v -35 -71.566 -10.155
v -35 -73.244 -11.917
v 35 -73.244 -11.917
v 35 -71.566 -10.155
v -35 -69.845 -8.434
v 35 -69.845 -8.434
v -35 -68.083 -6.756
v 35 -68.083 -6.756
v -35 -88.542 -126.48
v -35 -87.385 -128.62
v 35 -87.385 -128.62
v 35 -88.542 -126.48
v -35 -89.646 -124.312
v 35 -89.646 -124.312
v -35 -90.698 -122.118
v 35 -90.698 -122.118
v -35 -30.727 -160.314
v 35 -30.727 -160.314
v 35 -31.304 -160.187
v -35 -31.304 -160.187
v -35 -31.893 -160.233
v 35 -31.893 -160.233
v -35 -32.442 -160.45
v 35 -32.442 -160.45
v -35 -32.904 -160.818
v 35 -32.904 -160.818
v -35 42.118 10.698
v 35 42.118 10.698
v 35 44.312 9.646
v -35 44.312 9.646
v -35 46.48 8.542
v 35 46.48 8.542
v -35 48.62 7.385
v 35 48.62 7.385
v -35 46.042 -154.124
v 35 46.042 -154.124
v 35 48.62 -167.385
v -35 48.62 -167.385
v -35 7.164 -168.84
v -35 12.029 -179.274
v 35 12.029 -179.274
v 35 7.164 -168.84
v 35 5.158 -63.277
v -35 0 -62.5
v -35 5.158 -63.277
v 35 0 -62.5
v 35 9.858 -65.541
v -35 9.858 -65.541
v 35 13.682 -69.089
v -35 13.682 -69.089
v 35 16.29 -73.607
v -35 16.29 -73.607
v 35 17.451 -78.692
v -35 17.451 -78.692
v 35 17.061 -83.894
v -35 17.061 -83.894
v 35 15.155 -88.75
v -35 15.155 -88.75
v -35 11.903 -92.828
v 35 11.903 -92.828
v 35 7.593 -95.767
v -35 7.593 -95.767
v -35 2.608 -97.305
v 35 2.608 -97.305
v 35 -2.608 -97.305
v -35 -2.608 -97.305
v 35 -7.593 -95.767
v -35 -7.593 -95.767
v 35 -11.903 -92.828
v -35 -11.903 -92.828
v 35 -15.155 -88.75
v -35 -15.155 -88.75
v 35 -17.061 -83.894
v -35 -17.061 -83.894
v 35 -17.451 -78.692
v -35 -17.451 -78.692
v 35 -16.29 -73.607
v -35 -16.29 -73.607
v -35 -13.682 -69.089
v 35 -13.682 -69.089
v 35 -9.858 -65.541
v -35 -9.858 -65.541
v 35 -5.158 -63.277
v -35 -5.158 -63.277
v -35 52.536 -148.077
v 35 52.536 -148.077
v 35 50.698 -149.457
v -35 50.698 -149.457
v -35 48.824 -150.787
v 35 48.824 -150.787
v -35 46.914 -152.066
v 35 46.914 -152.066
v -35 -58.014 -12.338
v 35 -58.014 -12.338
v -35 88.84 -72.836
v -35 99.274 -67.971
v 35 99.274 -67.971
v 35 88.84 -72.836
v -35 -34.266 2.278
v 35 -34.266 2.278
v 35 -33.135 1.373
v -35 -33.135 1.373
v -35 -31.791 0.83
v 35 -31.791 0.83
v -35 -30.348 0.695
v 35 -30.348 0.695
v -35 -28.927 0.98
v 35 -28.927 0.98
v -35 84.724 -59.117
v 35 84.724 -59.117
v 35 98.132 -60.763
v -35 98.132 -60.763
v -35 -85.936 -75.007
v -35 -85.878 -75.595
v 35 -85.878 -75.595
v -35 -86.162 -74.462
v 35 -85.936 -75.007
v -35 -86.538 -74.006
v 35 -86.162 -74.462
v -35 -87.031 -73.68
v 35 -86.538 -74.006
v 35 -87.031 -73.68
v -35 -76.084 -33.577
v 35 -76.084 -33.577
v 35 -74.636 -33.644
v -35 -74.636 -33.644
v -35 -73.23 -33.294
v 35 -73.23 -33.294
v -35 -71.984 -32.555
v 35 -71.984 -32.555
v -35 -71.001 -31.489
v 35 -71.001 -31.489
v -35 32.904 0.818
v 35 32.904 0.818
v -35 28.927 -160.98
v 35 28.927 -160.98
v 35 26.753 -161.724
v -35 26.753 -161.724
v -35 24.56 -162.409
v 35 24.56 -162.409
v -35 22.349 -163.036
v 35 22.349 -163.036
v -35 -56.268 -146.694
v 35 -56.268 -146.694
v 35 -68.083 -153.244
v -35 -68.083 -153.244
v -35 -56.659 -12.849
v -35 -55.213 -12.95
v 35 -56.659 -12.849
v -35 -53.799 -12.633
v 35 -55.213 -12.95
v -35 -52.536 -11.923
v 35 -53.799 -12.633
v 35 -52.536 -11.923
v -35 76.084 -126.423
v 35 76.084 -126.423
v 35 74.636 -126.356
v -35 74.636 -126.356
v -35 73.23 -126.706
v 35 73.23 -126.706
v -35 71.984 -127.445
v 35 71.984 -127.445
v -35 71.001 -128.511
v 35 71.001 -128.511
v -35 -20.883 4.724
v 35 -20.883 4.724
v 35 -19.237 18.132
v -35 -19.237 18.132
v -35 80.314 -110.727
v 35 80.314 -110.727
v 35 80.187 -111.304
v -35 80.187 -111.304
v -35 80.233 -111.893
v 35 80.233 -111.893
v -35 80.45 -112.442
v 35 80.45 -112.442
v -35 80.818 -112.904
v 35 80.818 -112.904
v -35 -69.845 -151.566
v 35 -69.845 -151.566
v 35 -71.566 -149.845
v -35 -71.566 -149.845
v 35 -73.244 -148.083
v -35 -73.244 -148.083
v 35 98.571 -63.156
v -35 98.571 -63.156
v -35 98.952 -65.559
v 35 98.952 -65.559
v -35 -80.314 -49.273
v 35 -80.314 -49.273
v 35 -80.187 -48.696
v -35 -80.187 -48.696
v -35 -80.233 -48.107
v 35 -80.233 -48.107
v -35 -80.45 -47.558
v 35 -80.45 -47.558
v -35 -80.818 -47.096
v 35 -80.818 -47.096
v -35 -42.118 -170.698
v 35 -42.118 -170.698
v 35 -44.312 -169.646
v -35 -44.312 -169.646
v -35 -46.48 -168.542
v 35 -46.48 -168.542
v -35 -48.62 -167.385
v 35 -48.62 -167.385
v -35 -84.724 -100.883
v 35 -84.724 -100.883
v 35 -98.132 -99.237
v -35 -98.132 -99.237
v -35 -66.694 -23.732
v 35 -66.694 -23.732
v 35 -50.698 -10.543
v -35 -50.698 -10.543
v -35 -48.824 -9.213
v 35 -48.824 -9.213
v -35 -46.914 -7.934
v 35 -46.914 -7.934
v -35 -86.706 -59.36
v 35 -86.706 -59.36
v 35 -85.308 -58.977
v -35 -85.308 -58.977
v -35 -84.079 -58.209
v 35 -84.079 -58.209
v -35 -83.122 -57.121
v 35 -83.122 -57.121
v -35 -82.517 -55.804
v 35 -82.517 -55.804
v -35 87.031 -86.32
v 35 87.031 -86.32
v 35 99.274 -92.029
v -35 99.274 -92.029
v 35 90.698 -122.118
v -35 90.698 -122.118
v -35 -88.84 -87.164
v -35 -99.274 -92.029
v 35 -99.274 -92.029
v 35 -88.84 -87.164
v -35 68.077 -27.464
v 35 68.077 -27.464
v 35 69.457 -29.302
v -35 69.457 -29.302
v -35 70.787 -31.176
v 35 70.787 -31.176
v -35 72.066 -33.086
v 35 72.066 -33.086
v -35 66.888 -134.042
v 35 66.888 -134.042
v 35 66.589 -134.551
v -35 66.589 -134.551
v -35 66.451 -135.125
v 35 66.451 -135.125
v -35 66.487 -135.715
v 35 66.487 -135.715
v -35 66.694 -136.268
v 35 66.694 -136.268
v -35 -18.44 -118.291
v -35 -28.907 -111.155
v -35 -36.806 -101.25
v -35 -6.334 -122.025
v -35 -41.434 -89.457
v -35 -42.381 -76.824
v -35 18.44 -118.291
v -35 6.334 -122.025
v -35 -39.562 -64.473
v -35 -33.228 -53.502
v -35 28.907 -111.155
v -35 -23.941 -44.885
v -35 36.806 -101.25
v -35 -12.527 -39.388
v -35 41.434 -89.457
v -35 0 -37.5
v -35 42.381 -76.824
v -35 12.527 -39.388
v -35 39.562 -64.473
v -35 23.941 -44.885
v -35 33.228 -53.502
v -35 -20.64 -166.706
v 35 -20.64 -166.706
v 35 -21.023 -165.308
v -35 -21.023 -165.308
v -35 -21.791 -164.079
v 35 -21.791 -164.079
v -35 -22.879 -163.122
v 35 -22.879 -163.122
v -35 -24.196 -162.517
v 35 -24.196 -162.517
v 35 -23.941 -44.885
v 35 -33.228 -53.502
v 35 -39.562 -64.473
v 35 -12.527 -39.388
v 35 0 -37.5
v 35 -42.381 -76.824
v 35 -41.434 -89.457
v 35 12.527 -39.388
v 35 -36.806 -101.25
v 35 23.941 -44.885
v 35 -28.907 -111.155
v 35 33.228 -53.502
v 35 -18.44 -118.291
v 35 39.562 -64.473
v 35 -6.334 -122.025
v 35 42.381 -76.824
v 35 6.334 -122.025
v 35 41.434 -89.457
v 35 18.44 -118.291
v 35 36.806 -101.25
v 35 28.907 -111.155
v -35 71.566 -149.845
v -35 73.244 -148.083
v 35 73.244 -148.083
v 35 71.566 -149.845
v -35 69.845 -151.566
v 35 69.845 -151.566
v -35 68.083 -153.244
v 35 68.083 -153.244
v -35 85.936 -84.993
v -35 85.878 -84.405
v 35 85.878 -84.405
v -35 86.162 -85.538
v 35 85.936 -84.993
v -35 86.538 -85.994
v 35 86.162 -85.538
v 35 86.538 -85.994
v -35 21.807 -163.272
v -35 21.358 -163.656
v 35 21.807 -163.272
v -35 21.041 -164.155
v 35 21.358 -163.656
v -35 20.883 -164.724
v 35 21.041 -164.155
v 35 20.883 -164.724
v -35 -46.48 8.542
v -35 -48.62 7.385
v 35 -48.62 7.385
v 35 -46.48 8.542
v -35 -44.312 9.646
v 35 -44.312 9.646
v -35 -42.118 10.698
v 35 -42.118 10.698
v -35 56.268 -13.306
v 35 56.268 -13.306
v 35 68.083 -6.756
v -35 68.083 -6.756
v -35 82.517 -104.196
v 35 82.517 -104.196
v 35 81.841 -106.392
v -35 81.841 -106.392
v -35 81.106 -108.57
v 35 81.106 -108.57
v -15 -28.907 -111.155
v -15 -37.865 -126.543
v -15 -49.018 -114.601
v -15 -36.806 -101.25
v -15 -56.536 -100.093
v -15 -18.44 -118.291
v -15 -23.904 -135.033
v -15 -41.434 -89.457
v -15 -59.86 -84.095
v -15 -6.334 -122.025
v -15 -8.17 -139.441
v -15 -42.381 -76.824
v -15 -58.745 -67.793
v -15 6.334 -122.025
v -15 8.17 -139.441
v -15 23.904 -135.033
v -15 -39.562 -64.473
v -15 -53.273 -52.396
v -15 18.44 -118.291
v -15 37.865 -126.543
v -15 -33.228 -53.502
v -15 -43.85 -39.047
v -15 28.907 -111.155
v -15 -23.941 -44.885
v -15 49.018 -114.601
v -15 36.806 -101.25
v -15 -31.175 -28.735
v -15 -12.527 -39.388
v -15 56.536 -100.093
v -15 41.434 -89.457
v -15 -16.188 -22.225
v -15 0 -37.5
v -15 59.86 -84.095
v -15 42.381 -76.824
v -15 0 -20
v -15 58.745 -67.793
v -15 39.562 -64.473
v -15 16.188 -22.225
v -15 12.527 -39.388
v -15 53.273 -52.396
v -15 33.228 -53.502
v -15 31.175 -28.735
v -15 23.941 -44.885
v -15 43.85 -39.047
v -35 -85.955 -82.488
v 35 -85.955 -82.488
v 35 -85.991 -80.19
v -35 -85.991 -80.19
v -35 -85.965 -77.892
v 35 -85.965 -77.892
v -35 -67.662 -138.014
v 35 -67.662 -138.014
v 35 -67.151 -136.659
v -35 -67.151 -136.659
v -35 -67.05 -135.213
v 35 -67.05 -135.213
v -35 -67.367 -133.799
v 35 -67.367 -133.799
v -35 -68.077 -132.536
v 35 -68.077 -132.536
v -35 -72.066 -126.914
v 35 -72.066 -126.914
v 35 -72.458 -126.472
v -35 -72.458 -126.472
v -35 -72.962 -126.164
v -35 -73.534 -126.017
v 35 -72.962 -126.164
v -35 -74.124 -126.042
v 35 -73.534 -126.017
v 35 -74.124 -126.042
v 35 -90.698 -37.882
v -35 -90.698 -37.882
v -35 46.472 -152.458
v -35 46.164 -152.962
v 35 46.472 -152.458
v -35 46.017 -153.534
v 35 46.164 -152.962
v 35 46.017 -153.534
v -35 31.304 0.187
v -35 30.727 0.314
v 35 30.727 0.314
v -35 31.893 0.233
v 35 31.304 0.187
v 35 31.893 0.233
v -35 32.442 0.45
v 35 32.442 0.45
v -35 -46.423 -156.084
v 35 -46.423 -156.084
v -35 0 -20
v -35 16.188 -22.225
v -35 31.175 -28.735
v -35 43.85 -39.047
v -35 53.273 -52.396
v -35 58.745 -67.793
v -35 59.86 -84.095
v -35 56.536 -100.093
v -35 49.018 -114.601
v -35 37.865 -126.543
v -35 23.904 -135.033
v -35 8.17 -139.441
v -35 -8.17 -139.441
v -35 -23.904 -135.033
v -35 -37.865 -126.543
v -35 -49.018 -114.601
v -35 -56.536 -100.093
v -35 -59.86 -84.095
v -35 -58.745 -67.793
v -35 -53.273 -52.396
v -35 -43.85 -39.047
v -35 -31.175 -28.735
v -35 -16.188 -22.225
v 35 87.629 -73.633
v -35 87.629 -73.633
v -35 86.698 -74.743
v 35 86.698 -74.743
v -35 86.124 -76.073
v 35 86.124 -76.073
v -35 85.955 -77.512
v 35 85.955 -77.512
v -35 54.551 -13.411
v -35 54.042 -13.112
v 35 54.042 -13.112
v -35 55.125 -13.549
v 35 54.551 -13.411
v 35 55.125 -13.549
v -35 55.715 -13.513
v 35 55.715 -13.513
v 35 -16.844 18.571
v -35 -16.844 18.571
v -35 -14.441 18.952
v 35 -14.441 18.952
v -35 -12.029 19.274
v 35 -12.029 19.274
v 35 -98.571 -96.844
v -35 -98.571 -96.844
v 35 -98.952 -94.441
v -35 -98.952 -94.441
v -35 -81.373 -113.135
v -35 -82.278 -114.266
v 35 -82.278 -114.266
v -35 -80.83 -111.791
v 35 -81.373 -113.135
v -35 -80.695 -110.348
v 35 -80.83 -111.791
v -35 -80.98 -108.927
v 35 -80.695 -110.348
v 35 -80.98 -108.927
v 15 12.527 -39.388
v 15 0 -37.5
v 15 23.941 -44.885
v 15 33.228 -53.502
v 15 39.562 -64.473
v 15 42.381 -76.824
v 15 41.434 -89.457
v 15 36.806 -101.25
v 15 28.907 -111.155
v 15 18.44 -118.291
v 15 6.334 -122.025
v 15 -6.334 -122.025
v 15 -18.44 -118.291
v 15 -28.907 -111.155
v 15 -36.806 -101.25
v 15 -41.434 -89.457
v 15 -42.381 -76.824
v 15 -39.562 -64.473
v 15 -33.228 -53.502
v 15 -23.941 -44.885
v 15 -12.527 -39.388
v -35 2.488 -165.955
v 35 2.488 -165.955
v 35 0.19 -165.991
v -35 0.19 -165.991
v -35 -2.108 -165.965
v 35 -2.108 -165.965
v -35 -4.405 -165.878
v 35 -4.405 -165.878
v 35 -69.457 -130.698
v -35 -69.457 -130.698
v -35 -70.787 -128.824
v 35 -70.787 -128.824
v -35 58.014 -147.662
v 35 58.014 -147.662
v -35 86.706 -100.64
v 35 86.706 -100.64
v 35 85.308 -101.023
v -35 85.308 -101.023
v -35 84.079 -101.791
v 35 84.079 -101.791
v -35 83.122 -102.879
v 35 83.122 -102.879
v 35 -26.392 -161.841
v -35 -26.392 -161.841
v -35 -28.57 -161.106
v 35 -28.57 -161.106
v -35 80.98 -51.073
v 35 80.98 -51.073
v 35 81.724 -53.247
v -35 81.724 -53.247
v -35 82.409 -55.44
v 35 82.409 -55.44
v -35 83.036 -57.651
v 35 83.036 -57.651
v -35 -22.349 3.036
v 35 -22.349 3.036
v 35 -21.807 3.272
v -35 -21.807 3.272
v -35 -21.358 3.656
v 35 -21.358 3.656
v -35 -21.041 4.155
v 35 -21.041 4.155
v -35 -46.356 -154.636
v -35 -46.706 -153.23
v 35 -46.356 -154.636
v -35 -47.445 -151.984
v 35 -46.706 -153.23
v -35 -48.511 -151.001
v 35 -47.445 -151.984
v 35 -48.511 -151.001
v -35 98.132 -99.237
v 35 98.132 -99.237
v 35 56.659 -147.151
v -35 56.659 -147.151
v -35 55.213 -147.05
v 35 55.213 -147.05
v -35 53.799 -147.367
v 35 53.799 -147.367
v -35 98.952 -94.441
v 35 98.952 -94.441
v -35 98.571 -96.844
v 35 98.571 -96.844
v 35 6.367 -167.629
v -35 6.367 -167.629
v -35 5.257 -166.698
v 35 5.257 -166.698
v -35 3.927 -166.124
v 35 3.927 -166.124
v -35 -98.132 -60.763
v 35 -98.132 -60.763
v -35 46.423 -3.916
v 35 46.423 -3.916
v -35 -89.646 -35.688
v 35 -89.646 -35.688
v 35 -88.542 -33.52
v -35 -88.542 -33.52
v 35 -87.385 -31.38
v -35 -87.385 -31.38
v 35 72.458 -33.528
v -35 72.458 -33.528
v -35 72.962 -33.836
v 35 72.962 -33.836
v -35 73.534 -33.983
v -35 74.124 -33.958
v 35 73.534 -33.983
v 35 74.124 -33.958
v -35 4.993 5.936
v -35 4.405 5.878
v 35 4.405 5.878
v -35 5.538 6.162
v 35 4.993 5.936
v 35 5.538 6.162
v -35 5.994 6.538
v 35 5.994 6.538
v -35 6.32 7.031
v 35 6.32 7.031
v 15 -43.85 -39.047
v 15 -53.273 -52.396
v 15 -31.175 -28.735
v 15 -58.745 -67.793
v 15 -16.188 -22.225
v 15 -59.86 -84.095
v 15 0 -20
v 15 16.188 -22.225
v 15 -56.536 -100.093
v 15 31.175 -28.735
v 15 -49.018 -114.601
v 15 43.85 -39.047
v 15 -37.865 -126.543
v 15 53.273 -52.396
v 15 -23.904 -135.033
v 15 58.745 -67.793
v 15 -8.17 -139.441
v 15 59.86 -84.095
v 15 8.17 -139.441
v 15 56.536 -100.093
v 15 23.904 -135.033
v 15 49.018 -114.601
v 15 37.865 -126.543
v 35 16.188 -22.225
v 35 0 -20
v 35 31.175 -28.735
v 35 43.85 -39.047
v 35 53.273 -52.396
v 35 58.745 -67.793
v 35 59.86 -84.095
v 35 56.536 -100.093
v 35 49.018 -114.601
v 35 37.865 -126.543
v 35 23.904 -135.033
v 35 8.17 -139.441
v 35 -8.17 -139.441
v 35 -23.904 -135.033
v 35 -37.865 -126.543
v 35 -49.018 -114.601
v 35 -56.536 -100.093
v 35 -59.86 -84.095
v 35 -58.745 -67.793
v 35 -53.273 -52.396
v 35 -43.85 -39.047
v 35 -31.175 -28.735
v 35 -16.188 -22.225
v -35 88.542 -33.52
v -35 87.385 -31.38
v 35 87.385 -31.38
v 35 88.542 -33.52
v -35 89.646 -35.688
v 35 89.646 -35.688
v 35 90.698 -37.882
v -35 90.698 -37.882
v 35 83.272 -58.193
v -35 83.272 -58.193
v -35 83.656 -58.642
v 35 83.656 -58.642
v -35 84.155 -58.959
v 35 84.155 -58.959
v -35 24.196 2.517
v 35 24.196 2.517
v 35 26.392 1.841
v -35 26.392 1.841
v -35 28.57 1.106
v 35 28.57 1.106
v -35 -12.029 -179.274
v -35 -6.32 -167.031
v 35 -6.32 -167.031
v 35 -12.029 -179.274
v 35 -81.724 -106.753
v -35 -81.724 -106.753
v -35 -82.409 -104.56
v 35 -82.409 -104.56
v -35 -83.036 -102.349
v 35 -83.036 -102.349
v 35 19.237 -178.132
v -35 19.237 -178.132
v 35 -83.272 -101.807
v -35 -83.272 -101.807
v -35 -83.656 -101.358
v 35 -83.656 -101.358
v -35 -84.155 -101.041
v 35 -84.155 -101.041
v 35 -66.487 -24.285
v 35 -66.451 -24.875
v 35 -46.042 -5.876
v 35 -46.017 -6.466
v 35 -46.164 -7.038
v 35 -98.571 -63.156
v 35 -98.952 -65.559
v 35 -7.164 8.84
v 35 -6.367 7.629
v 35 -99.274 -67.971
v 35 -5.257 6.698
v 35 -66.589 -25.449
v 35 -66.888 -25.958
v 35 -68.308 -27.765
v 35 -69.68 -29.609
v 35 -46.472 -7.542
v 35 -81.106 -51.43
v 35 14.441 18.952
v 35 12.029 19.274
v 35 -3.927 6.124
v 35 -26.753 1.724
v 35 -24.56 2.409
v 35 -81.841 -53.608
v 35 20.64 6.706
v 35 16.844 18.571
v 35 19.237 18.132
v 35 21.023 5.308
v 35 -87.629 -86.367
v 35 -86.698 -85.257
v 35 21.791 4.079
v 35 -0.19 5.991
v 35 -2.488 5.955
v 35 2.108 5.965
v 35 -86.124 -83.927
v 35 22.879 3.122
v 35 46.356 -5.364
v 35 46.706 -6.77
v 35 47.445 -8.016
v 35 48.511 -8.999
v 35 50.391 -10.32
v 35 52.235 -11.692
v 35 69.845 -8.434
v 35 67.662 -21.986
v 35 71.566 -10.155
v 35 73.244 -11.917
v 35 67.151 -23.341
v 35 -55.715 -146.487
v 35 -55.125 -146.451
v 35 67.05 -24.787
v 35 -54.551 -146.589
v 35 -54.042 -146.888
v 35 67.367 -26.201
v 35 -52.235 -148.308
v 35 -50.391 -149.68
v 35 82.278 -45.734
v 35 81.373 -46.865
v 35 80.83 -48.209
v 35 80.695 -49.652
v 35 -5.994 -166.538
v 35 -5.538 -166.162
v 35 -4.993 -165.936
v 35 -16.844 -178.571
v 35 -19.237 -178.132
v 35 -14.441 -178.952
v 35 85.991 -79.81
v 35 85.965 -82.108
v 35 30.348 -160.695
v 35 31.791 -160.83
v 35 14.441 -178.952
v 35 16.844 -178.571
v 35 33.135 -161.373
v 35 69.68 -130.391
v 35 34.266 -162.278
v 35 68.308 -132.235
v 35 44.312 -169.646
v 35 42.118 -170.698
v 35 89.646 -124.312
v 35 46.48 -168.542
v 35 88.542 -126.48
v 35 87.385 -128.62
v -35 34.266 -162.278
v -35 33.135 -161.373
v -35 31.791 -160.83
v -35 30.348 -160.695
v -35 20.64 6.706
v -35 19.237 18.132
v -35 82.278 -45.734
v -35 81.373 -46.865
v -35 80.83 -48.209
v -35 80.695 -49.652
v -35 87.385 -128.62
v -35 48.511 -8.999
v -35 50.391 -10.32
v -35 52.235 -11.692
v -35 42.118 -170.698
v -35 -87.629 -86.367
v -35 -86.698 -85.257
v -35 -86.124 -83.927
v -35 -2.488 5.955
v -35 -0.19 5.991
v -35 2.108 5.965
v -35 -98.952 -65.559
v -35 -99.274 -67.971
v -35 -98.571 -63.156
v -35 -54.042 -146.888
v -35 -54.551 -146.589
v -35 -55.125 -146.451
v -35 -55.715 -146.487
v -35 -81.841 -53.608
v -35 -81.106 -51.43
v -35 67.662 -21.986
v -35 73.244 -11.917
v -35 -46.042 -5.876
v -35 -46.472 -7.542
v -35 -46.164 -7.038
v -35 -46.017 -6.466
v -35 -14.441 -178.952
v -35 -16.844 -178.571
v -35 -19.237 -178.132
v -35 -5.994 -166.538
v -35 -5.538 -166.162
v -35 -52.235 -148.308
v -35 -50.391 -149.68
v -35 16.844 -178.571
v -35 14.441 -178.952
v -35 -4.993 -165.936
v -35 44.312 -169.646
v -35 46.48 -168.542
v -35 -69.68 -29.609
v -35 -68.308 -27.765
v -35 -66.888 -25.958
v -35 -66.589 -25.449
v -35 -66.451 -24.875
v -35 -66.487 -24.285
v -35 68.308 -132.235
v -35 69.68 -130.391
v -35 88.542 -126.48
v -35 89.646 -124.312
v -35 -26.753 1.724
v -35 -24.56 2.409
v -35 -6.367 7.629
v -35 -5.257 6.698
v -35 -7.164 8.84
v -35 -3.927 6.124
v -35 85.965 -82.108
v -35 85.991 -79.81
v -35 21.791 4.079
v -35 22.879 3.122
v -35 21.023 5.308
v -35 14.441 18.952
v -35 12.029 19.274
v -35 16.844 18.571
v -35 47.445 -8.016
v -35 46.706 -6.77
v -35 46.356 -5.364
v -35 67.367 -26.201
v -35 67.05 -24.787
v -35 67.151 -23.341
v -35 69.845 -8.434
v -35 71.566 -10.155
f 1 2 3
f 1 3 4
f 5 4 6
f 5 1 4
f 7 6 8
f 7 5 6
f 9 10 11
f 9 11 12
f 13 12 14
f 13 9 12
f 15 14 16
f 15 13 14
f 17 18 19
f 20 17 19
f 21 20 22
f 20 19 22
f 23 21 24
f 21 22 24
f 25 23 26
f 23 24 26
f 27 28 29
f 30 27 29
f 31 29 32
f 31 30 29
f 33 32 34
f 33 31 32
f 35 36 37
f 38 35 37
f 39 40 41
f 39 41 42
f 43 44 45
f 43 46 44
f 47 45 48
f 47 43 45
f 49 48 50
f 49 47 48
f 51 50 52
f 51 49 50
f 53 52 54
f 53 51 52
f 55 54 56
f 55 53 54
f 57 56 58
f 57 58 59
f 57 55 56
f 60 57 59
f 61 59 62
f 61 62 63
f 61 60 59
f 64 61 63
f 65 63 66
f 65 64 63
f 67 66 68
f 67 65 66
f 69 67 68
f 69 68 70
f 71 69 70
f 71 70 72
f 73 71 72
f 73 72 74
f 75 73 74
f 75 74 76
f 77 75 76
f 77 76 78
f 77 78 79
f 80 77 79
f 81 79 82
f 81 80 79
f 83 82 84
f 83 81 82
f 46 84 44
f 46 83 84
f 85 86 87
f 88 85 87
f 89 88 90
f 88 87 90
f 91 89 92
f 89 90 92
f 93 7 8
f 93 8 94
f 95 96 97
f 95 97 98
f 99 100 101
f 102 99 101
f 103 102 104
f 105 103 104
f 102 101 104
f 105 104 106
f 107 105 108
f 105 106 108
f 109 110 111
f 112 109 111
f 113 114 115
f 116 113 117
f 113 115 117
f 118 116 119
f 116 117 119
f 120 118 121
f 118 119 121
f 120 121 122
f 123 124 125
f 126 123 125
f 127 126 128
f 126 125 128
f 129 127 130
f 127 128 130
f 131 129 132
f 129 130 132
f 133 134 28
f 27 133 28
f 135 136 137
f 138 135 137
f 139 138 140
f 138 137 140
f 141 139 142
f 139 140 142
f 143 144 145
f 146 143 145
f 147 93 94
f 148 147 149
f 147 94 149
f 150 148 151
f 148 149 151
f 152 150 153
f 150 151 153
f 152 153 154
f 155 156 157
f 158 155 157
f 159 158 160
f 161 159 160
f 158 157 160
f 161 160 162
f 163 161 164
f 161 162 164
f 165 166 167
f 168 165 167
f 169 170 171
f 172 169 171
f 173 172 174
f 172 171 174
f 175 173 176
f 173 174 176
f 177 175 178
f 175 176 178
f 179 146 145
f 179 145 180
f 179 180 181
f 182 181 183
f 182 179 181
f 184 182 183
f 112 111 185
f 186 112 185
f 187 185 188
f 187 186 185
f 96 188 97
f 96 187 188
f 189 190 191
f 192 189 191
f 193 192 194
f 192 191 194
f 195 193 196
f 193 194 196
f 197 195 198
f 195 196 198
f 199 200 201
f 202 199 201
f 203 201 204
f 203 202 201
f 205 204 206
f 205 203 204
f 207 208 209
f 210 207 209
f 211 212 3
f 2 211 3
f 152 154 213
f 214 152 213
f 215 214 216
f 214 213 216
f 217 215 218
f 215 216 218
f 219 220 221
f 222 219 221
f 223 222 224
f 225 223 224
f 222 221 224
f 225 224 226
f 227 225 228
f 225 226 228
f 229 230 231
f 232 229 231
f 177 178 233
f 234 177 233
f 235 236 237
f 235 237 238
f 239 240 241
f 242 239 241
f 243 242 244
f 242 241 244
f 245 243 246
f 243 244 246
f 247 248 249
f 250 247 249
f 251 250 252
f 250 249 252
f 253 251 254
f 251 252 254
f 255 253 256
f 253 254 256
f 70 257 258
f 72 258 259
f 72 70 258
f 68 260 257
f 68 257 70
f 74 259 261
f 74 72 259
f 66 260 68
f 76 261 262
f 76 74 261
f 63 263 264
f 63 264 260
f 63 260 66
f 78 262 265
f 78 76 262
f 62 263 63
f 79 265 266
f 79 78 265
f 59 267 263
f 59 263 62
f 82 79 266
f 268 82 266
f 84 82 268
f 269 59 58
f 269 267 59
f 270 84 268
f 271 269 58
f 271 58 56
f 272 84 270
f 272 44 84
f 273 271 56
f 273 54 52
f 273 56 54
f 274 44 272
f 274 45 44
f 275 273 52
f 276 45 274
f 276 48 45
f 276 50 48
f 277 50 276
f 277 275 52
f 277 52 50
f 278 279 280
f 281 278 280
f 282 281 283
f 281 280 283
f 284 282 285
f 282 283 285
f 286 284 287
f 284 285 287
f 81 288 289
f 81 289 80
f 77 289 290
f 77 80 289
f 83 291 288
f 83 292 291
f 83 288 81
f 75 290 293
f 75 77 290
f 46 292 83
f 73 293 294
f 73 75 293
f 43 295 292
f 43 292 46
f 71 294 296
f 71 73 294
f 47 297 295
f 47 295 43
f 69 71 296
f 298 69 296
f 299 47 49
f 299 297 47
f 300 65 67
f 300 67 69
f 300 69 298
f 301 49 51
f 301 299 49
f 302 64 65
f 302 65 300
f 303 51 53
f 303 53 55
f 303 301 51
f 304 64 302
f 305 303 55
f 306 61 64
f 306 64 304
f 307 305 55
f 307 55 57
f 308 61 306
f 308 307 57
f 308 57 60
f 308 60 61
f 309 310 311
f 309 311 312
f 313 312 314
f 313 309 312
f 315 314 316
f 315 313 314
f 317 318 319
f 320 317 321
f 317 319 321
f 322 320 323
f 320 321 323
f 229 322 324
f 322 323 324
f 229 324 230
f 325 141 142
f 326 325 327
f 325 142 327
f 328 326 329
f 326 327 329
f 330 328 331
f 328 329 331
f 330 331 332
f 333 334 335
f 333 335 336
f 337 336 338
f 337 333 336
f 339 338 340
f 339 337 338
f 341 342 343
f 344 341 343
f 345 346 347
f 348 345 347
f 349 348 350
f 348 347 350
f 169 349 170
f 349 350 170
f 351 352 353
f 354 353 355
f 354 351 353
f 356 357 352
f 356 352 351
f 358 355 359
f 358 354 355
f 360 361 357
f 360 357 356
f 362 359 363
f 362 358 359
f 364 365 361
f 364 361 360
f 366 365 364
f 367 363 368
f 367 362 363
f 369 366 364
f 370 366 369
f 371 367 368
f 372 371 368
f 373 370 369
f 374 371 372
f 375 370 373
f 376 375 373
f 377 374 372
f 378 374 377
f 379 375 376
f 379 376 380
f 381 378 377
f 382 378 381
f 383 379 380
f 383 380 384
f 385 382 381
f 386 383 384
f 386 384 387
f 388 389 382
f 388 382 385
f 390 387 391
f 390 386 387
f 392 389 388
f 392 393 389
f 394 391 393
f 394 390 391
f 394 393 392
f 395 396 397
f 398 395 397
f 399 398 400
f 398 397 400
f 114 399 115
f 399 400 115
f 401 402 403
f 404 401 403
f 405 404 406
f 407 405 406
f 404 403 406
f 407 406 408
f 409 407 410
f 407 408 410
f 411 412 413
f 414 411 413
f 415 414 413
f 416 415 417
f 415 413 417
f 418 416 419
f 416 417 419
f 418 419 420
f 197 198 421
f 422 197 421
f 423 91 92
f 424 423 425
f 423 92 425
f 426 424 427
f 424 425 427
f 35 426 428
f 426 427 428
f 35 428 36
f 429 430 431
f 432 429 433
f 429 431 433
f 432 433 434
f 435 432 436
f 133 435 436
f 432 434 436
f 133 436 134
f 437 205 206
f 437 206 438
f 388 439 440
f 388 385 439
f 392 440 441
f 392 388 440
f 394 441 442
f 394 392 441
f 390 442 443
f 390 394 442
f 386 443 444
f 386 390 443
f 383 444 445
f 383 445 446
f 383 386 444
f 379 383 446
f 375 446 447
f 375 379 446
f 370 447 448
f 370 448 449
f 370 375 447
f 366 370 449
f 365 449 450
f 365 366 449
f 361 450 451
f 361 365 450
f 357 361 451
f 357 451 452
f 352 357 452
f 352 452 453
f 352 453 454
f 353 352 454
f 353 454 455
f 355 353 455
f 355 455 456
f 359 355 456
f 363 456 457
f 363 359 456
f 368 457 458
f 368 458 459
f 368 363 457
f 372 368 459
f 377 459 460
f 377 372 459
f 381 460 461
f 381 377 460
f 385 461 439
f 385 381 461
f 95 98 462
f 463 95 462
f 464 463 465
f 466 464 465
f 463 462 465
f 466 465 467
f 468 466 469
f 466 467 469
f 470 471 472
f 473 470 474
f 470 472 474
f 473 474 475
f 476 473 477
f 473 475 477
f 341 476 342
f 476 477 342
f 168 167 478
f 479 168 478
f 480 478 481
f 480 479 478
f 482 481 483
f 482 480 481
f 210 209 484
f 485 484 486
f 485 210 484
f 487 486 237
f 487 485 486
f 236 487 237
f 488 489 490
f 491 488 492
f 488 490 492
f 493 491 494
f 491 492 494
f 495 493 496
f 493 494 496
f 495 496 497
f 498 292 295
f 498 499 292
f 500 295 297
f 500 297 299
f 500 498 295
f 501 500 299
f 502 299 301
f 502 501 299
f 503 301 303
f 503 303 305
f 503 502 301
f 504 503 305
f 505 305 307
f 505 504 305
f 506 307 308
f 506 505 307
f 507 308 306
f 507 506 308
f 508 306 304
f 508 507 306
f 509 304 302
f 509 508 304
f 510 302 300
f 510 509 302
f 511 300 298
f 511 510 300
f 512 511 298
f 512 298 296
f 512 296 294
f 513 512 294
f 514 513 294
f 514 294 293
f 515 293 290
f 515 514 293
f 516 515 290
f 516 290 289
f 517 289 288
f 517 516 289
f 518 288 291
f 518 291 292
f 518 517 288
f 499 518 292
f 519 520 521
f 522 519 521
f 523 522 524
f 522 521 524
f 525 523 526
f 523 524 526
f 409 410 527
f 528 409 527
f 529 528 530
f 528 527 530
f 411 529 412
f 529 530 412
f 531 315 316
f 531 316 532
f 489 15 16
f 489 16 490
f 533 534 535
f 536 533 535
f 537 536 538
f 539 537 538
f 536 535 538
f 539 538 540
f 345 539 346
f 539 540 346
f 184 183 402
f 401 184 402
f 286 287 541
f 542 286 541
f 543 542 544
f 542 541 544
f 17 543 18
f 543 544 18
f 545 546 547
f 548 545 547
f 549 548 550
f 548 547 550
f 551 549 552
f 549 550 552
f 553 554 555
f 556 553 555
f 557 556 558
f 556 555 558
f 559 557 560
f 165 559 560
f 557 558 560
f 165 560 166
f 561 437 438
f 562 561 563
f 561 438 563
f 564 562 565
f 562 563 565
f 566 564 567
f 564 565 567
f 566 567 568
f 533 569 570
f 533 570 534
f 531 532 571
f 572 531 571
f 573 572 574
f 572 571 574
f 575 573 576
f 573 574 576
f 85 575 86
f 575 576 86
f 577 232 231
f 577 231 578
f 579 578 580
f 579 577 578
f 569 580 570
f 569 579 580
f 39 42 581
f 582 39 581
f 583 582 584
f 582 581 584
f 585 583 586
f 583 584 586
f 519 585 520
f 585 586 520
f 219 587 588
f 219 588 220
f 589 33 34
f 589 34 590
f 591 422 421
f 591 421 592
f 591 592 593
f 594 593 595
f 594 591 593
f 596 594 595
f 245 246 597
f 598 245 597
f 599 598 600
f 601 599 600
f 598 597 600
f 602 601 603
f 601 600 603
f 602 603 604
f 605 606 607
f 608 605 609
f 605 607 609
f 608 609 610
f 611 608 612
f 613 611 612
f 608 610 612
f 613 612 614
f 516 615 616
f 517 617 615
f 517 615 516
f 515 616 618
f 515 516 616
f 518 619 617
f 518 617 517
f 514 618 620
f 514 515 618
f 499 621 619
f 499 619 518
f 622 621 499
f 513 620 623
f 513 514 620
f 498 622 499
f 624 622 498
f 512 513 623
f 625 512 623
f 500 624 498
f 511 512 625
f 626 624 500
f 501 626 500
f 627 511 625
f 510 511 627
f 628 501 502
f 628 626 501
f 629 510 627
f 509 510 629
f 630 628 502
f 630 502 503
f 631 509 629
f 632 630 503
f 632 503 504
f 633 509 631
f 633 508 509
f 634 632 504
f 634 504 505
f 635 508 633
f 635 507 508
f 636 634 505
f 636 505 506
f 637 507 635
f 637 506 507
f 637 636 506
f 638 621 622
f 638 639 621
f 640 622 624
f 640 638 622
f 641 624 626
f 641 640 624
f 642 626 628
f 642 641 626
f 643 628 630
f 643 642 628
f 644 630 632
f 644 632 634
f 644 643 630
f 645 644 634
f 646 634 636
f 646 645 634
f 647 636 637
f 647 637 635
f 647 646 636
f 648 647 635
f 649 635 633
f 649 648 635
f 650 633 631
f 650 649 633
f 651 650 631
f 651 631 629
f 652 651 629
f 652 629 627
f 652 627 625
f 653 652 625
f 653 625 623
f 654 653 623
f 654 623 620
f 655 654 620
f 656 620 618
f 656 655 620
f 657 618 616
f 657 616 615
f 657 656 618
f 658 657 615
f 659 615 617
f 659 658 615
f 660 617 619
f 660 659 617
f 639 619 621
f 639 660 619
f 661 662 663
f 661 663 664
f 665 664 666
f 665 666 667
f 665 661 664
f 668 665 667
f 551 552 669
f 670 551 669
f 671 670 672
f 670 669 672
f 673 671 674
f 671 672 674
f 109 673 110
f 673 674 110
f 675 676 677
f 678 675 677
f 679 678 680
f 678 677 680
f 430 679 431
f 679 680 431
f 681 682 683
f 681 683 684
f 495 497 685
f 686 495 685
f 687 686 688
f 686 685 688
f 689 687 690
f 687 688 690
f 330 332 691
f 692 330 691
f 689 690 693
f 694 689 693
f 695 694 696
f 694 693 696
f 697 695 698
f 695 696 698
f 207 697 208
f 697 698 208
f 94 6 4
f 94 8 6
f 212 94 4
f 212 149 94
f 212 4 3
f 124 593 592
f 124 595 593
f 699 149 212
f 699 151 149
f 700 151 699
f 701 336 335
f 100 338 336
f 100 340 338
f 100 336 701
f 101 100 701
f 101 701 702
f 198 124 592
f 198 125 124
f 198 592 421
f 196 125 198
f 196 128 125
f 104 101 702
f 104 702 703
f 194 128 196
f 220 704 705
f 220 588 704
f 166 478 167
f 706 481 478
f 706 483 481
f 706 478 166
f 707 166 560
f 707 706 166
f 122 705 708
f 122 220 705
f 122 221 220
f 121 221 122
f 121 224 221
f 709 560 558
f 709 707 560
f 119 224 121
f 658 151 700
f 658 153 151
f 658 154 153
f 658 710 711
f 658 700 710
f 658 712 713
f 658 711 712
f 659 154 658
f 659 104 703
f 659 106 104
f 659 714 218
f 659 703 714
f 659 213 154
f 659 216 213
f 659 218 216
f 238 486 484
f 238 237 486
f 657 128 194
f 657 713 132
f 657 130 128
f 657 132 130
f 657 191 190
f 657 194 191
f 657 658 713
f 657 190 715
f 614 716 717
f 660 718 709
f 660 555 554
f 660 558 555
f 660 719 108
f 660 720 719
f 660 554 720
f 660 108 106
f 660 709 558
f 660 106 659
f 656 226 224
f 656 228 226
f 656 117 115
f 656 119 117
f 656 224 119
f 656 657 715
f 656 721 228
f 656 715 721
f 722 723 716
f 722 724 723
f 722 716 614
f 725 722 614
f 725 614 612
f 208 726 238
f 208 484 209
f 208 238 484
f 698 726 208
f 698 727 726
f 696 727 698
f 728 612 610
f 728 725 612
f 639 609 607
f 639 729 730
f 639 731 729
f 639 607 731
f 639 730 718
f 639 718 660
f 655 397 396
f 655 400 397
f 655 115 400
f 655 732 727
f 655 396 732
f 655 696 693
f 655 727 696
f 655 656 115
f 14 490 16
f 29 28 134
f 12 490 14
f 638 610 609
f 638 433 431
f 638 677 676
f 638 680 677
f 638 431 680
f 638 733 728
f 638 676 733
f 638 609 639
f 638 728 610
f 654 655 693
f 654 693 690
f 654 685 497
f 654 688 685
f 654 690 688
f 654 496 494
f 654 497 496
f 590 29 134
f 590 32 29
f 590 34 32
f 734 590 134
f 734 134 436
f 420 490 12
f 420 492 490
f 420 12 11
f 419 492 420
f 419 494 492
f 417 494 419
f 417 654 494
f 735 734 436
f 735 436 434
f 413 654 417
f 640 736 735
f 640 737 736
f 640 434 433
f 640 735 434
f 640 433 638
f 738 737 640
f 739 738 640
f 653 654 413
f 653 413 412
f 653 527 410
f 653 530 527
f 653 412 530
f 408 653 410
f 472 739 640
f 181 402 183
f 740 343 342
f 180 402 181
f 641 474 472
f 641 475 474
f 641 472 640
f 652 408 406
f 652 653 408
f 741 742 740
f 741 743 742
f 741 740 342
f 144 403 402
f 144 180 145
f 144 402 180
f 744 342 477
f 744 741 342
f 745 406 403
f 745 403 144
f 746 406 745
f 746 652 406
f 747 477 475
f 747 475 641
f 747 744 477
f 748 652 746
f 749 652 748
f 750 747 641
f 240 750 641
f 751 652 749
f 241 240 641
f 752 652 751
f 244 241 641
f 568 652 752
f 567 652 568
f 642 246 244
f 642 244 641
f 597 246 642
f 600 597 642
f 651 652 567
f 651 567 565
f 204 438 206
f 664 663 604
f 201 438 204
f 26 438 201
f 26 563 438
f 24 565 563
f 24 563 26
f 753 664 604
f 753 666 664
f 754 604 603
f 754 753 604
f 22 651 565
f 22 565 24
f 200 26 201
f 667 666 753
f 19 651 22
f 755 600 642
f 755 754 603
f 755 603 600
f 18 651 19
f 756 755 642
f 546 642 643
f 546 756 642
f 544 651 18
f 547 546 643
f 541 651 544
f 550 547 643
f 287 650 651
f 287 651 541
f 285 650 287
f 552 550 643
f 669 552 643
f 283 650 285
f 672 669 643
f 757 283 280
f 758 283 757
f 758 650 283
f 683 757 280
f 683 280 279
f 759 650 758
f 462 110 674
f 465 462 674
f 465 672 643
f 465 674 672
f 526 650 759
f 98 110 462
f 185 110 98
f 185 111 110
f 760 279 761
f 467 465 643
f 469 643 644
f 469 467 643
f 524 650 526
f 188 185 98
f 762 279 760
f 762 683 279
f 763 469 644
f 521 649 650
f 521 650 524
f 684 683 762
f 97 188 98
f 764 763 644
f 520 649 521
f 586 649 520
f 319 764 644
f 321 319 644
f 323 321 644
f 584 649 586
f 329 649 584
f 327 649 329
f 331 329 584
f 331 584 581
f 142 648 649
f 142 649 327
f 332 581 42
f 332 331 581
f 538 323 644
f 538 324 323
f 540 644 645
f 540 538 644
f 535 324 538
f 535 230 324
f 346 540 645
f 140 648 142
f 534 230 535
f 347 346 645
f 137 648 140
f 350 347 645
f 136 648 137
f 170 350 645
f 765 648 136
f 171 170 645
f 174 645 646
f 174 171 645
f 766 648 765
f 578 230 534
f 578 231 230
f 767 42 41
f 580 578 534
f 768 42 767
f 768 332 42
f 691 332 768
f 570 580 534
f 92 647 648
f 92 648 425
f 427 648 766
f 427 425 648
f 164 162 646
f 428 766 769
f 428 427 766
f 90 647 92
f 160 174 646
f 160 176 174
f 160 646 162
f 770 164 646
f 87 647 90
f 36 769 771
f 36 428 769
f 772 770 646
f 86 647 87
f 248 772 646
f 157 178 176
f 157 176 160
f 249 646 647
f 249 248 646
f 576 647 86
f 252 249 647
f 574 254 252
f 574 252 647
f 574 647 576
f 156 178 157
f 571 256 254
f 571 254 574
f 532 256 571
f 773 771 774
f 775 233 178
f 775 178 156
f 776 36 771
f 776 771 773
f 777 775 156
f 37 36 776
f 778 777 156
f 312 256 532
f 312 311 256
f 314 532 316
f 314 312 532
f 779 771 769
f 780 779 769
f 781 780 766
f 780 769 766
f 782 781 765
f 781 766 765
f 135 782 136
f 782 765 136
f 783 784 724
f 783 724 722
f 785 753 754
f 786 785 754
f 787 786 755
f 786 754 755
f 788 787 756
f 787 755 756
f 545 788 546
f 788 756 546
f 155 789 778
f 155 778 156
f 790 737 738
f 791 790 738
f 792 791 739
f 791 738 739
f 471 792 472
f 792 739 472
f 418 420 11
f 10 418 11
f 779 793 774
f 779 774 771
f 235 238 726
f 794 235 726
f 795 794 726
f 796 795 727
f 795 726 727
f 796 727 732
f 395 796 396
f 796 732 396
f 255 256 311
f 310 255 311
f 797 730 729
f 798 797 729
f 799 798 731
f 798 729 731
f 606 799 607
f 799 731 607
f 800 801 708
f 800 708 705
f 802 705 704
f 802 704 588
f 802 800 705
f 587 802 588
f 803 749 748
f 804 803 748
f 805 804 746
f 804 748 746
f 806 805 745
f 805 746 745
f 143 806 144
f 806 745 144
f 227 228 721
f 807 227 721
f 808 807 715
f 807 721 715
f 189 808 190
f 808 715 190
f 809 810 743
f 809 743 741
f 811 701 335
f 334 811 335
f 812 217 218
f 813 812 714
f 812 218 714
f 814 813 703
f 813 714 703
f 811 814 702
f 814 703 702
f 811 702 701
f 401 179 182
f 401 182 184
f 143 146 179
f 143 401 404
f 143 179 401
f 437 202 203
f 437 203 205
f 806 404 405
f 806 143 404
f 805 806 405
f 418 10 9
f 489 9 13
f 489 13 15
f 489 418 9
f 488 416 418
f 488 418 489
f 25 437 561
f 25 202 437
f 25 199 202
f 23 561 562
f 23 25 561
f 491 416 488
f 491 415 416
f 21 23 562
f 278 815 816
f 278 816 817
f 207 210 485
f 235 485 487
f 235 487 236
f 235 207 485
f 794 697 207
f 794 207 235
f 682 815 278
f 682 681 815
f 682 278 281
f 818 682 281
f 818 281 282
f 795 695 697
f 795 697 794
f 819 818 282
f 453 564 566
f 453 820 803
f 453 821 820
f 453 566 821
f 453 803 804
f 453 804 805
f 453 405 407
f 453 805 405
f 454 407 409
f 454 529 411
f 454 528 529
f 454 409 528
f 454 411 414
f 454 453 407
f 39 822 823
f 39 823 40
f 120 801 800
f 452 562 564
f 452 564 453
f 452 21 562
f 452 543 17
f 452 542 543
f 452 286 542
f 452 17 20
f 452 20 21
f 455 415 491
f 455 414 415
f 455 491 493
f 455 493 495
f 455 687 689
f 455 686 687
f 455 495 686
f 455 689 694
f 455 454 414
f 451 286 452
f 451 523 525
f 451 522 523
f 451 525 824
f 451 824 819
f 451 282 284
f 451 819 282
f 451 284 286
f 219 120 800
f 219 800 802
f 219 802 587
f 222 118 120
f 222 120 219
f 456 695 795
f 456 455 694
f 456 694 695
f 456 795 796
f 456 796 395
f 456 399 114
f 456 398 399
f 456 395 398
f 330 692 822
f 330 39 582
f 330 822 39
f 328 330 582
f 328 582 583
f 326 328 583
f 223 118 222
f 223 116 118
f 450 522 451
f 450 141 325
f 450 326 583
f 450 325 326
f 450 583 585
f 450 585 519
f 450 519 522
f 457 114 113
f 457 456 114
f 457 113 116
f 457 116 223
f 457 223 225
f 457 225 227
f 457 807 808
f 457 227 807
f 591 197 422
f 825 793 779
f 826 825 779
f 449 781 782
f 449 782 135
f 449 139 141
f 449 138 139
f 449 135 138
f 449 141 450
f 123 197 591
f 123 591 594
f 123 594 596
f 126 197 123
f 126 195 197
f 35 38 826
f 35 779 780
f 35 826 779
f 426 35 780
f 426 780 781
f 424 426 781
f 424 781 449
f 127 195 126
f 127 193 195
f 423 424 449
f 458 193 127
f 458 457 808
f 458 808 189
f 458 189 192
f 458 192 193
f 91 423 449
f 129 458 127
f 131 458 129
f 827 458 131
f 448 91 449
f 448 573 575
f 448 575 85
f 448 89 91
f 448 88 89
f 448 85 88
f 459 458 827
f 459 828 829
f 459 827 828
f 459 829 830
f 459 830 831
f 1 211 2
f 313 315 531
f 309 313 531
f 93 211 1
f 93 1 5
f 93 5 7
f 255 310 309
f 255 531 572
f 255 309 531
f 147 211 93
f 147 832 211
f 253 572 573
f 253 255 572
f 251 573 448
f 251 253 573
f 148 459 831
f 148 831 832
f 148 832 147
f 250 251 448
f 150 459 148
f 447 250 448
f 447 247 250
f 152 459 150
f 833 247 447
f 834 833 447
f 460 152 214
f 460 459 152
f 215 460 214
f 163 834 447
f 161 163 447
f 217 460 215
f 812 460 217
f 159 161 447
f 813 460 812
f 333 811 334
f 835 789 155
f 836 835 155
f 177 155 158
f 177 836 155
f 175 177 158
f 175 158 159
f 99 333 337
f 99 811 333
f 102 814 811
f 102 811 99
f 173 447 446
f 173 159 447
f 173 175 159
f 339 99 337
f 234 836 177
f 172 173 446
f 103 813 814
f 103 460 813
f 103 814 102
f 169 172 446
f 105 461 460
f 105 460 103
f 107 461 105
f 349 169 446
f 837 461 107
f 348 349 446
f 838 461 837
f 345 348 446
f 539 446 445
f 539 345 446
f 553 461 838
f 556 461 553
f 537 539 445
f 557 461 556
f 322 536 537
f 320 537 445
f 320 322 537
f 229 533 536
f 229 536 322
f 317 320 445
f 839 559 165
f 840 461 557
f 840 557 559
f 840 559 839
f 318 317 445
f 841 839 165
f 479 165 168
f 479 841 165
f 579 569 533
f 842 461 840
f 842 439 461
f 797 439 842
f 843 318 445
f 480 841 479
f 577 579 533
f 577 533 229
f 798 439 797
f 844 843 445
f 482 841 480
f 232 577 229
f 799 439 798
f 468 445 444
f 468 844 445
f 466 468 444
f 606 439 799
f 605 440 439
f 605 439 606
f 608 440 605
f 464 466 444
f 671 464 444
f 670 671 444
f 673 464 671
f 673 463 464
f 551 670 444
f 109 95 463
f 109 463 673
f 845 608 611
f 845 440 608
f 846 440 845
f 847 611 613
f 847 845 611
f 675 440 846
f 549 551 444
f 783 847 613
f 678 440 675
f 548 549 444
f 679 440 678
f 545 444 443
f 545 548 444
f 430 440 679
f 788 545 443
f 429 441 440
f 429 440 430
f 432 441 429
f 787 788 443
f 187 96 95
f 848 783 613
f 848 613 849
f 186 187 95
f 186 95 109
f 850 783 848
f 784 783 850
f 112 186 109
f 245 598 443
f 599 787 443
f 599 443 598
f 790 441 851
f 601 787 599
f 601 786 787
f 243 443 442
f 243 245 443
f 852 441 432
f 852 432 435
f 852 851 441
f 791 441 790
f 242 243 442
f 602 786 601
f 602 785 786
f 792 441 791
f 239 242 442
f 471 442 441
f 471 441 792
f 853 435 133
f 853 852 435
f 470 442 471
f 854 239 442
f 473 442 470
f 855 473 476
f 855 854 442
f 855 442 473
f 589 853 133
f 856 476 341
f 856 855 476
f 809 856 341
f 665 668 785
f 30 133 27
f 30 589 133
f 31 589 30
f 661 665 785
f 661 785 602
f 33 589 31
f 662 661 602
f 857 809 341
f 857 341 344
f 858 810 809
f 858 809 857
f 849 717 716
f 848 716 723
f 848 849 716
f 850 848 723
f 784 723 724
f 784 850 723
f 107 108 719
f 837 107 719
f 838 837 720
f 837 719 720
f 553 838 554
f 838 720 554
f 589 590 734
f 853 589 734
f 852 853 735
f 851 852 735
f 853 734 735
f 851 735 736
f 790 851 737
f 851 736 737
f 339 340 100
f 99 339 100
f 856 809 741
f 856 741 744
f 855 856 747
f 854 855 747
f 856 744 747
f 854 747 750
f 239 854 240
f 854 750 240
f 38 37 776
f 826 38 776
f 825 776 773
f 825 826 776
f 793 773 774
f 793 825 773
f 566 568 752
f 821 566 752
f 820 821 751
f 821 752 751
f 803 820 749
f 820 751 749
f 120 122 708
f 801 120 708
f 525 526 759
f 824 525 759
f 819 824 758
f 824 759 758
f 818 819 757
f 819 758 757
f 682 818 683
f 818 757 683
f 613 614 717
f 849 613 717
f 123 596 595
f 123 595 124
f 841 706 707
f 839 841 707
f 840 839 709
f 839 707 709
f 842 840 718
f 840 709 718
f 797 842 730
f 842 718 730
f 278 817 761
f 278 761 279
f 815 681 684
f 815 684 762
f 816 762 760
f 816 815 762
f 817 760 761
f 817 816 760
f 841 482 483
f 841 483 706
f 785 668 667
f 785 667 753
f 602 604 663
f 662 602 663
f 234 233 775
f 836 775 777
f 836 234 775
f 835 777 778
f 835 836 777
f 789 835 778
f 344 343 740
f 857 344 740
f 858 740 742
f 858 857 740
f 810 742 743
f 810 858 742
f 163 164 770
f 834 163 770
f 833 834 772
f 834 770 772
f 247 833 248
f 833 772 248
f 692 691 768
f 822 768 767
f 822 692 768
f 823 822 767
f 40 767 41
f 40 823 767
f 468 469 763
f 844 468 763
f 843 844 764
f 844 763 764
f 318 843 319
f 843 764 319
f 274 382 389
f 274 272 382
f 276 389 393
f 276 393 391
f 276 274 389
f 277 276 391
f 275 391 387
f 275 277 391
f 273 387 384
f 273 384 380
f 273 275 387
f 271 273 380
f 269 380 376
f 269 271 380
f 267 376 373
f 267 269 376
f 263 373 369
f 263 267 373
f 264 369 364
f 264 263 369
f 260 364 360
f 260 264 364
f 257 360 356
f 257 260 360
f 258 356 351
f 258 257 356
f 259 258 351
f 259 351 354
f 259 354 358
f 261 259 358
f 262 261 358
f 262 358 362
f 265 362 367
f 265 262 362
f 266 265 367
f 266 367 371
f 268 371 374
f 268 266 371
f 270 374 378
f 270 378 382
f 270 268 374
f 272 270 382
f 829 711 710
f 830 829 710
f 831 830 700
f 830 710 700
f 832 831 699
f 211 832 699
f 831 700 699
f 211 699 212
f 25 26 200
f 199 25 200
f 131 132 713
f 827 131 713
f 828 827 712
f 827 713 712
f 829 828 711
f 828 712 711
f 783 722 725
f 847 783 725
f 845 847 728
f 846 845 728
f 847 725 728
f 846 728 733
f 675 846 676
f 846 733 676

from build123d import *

# Parameters (mm, degrees)
F3_DEPTH        = 70.001
F3_COPIES_COUNT = 20


# Not quite as in the source:
# - a feature of the source that left no trace in its solid (it failed there, or was rolled back) is left out
# - a pattern or mirror of a feature is missing from the dataset's text; its kind, count and spacing are read off the source's solid


with BuildPart() as f1:
    # F0 (on Front) → F1 (revolve)
    with BuildSketch(Plane.XZ):
        Polygon((35, -20), (35, 20), (-35, 20), (-35, -20), (-15, -20), (-15, -37.5), (-35, -37.5), (-35, -62.5), (35, -62.5), (35, -37.5), (15, -37.5), (15, -20), align=None)
    revolve(axis=Axis((-7.5, 0, -80), (-1, 0, 0)))

    # F2 (on face) → F3 (cut, through all)
    with BuildSketch(Plane.YZ.offset(35)):
        with BuildLine():
            ThreePointArc((-2.4875303205, 5.9552673354), (0.9594167449, 5.9859018055), (4.4048221019, 5.878363585))
            ThreePointArc((4.4048221019, 5.878363585), (5.5383005859, 6.1619770528), (6.3198858178, 7.0305014326))
            Line((6.3198858178, 7.0305014326), (12.0290632191, 19.2738718801))
            ThreePointArc((12.0290632191, 19.2738718801), (0, 20), (-12.0290632191, 19.2738718801))
            Line((-12.0290632191, 19.2738718801), (-7.1637078206, 8.8400835574))
            ThreePointArc((-7.1637078206, 8.8400835574), (-5.2573859952, 6.6977976646), (-2.4875303205, 5.9552673354))
        make_face()
    f3 = extrude(amount=-F3_DEPTH, mode=Mode.SUBTRACT)

    # F3_copies: F3 ×20 about axis
    f3_copies_axis = Axis((0, 0, -80), (1, 0, 0))
    for i in range(1, F3_COPIES_COUNT):
        add(f3.rotate(f3_copies_axis, i * 360 / F3_COPIES_COUNT), mode=Mode.SUBTRACT)


solid = f1.part
